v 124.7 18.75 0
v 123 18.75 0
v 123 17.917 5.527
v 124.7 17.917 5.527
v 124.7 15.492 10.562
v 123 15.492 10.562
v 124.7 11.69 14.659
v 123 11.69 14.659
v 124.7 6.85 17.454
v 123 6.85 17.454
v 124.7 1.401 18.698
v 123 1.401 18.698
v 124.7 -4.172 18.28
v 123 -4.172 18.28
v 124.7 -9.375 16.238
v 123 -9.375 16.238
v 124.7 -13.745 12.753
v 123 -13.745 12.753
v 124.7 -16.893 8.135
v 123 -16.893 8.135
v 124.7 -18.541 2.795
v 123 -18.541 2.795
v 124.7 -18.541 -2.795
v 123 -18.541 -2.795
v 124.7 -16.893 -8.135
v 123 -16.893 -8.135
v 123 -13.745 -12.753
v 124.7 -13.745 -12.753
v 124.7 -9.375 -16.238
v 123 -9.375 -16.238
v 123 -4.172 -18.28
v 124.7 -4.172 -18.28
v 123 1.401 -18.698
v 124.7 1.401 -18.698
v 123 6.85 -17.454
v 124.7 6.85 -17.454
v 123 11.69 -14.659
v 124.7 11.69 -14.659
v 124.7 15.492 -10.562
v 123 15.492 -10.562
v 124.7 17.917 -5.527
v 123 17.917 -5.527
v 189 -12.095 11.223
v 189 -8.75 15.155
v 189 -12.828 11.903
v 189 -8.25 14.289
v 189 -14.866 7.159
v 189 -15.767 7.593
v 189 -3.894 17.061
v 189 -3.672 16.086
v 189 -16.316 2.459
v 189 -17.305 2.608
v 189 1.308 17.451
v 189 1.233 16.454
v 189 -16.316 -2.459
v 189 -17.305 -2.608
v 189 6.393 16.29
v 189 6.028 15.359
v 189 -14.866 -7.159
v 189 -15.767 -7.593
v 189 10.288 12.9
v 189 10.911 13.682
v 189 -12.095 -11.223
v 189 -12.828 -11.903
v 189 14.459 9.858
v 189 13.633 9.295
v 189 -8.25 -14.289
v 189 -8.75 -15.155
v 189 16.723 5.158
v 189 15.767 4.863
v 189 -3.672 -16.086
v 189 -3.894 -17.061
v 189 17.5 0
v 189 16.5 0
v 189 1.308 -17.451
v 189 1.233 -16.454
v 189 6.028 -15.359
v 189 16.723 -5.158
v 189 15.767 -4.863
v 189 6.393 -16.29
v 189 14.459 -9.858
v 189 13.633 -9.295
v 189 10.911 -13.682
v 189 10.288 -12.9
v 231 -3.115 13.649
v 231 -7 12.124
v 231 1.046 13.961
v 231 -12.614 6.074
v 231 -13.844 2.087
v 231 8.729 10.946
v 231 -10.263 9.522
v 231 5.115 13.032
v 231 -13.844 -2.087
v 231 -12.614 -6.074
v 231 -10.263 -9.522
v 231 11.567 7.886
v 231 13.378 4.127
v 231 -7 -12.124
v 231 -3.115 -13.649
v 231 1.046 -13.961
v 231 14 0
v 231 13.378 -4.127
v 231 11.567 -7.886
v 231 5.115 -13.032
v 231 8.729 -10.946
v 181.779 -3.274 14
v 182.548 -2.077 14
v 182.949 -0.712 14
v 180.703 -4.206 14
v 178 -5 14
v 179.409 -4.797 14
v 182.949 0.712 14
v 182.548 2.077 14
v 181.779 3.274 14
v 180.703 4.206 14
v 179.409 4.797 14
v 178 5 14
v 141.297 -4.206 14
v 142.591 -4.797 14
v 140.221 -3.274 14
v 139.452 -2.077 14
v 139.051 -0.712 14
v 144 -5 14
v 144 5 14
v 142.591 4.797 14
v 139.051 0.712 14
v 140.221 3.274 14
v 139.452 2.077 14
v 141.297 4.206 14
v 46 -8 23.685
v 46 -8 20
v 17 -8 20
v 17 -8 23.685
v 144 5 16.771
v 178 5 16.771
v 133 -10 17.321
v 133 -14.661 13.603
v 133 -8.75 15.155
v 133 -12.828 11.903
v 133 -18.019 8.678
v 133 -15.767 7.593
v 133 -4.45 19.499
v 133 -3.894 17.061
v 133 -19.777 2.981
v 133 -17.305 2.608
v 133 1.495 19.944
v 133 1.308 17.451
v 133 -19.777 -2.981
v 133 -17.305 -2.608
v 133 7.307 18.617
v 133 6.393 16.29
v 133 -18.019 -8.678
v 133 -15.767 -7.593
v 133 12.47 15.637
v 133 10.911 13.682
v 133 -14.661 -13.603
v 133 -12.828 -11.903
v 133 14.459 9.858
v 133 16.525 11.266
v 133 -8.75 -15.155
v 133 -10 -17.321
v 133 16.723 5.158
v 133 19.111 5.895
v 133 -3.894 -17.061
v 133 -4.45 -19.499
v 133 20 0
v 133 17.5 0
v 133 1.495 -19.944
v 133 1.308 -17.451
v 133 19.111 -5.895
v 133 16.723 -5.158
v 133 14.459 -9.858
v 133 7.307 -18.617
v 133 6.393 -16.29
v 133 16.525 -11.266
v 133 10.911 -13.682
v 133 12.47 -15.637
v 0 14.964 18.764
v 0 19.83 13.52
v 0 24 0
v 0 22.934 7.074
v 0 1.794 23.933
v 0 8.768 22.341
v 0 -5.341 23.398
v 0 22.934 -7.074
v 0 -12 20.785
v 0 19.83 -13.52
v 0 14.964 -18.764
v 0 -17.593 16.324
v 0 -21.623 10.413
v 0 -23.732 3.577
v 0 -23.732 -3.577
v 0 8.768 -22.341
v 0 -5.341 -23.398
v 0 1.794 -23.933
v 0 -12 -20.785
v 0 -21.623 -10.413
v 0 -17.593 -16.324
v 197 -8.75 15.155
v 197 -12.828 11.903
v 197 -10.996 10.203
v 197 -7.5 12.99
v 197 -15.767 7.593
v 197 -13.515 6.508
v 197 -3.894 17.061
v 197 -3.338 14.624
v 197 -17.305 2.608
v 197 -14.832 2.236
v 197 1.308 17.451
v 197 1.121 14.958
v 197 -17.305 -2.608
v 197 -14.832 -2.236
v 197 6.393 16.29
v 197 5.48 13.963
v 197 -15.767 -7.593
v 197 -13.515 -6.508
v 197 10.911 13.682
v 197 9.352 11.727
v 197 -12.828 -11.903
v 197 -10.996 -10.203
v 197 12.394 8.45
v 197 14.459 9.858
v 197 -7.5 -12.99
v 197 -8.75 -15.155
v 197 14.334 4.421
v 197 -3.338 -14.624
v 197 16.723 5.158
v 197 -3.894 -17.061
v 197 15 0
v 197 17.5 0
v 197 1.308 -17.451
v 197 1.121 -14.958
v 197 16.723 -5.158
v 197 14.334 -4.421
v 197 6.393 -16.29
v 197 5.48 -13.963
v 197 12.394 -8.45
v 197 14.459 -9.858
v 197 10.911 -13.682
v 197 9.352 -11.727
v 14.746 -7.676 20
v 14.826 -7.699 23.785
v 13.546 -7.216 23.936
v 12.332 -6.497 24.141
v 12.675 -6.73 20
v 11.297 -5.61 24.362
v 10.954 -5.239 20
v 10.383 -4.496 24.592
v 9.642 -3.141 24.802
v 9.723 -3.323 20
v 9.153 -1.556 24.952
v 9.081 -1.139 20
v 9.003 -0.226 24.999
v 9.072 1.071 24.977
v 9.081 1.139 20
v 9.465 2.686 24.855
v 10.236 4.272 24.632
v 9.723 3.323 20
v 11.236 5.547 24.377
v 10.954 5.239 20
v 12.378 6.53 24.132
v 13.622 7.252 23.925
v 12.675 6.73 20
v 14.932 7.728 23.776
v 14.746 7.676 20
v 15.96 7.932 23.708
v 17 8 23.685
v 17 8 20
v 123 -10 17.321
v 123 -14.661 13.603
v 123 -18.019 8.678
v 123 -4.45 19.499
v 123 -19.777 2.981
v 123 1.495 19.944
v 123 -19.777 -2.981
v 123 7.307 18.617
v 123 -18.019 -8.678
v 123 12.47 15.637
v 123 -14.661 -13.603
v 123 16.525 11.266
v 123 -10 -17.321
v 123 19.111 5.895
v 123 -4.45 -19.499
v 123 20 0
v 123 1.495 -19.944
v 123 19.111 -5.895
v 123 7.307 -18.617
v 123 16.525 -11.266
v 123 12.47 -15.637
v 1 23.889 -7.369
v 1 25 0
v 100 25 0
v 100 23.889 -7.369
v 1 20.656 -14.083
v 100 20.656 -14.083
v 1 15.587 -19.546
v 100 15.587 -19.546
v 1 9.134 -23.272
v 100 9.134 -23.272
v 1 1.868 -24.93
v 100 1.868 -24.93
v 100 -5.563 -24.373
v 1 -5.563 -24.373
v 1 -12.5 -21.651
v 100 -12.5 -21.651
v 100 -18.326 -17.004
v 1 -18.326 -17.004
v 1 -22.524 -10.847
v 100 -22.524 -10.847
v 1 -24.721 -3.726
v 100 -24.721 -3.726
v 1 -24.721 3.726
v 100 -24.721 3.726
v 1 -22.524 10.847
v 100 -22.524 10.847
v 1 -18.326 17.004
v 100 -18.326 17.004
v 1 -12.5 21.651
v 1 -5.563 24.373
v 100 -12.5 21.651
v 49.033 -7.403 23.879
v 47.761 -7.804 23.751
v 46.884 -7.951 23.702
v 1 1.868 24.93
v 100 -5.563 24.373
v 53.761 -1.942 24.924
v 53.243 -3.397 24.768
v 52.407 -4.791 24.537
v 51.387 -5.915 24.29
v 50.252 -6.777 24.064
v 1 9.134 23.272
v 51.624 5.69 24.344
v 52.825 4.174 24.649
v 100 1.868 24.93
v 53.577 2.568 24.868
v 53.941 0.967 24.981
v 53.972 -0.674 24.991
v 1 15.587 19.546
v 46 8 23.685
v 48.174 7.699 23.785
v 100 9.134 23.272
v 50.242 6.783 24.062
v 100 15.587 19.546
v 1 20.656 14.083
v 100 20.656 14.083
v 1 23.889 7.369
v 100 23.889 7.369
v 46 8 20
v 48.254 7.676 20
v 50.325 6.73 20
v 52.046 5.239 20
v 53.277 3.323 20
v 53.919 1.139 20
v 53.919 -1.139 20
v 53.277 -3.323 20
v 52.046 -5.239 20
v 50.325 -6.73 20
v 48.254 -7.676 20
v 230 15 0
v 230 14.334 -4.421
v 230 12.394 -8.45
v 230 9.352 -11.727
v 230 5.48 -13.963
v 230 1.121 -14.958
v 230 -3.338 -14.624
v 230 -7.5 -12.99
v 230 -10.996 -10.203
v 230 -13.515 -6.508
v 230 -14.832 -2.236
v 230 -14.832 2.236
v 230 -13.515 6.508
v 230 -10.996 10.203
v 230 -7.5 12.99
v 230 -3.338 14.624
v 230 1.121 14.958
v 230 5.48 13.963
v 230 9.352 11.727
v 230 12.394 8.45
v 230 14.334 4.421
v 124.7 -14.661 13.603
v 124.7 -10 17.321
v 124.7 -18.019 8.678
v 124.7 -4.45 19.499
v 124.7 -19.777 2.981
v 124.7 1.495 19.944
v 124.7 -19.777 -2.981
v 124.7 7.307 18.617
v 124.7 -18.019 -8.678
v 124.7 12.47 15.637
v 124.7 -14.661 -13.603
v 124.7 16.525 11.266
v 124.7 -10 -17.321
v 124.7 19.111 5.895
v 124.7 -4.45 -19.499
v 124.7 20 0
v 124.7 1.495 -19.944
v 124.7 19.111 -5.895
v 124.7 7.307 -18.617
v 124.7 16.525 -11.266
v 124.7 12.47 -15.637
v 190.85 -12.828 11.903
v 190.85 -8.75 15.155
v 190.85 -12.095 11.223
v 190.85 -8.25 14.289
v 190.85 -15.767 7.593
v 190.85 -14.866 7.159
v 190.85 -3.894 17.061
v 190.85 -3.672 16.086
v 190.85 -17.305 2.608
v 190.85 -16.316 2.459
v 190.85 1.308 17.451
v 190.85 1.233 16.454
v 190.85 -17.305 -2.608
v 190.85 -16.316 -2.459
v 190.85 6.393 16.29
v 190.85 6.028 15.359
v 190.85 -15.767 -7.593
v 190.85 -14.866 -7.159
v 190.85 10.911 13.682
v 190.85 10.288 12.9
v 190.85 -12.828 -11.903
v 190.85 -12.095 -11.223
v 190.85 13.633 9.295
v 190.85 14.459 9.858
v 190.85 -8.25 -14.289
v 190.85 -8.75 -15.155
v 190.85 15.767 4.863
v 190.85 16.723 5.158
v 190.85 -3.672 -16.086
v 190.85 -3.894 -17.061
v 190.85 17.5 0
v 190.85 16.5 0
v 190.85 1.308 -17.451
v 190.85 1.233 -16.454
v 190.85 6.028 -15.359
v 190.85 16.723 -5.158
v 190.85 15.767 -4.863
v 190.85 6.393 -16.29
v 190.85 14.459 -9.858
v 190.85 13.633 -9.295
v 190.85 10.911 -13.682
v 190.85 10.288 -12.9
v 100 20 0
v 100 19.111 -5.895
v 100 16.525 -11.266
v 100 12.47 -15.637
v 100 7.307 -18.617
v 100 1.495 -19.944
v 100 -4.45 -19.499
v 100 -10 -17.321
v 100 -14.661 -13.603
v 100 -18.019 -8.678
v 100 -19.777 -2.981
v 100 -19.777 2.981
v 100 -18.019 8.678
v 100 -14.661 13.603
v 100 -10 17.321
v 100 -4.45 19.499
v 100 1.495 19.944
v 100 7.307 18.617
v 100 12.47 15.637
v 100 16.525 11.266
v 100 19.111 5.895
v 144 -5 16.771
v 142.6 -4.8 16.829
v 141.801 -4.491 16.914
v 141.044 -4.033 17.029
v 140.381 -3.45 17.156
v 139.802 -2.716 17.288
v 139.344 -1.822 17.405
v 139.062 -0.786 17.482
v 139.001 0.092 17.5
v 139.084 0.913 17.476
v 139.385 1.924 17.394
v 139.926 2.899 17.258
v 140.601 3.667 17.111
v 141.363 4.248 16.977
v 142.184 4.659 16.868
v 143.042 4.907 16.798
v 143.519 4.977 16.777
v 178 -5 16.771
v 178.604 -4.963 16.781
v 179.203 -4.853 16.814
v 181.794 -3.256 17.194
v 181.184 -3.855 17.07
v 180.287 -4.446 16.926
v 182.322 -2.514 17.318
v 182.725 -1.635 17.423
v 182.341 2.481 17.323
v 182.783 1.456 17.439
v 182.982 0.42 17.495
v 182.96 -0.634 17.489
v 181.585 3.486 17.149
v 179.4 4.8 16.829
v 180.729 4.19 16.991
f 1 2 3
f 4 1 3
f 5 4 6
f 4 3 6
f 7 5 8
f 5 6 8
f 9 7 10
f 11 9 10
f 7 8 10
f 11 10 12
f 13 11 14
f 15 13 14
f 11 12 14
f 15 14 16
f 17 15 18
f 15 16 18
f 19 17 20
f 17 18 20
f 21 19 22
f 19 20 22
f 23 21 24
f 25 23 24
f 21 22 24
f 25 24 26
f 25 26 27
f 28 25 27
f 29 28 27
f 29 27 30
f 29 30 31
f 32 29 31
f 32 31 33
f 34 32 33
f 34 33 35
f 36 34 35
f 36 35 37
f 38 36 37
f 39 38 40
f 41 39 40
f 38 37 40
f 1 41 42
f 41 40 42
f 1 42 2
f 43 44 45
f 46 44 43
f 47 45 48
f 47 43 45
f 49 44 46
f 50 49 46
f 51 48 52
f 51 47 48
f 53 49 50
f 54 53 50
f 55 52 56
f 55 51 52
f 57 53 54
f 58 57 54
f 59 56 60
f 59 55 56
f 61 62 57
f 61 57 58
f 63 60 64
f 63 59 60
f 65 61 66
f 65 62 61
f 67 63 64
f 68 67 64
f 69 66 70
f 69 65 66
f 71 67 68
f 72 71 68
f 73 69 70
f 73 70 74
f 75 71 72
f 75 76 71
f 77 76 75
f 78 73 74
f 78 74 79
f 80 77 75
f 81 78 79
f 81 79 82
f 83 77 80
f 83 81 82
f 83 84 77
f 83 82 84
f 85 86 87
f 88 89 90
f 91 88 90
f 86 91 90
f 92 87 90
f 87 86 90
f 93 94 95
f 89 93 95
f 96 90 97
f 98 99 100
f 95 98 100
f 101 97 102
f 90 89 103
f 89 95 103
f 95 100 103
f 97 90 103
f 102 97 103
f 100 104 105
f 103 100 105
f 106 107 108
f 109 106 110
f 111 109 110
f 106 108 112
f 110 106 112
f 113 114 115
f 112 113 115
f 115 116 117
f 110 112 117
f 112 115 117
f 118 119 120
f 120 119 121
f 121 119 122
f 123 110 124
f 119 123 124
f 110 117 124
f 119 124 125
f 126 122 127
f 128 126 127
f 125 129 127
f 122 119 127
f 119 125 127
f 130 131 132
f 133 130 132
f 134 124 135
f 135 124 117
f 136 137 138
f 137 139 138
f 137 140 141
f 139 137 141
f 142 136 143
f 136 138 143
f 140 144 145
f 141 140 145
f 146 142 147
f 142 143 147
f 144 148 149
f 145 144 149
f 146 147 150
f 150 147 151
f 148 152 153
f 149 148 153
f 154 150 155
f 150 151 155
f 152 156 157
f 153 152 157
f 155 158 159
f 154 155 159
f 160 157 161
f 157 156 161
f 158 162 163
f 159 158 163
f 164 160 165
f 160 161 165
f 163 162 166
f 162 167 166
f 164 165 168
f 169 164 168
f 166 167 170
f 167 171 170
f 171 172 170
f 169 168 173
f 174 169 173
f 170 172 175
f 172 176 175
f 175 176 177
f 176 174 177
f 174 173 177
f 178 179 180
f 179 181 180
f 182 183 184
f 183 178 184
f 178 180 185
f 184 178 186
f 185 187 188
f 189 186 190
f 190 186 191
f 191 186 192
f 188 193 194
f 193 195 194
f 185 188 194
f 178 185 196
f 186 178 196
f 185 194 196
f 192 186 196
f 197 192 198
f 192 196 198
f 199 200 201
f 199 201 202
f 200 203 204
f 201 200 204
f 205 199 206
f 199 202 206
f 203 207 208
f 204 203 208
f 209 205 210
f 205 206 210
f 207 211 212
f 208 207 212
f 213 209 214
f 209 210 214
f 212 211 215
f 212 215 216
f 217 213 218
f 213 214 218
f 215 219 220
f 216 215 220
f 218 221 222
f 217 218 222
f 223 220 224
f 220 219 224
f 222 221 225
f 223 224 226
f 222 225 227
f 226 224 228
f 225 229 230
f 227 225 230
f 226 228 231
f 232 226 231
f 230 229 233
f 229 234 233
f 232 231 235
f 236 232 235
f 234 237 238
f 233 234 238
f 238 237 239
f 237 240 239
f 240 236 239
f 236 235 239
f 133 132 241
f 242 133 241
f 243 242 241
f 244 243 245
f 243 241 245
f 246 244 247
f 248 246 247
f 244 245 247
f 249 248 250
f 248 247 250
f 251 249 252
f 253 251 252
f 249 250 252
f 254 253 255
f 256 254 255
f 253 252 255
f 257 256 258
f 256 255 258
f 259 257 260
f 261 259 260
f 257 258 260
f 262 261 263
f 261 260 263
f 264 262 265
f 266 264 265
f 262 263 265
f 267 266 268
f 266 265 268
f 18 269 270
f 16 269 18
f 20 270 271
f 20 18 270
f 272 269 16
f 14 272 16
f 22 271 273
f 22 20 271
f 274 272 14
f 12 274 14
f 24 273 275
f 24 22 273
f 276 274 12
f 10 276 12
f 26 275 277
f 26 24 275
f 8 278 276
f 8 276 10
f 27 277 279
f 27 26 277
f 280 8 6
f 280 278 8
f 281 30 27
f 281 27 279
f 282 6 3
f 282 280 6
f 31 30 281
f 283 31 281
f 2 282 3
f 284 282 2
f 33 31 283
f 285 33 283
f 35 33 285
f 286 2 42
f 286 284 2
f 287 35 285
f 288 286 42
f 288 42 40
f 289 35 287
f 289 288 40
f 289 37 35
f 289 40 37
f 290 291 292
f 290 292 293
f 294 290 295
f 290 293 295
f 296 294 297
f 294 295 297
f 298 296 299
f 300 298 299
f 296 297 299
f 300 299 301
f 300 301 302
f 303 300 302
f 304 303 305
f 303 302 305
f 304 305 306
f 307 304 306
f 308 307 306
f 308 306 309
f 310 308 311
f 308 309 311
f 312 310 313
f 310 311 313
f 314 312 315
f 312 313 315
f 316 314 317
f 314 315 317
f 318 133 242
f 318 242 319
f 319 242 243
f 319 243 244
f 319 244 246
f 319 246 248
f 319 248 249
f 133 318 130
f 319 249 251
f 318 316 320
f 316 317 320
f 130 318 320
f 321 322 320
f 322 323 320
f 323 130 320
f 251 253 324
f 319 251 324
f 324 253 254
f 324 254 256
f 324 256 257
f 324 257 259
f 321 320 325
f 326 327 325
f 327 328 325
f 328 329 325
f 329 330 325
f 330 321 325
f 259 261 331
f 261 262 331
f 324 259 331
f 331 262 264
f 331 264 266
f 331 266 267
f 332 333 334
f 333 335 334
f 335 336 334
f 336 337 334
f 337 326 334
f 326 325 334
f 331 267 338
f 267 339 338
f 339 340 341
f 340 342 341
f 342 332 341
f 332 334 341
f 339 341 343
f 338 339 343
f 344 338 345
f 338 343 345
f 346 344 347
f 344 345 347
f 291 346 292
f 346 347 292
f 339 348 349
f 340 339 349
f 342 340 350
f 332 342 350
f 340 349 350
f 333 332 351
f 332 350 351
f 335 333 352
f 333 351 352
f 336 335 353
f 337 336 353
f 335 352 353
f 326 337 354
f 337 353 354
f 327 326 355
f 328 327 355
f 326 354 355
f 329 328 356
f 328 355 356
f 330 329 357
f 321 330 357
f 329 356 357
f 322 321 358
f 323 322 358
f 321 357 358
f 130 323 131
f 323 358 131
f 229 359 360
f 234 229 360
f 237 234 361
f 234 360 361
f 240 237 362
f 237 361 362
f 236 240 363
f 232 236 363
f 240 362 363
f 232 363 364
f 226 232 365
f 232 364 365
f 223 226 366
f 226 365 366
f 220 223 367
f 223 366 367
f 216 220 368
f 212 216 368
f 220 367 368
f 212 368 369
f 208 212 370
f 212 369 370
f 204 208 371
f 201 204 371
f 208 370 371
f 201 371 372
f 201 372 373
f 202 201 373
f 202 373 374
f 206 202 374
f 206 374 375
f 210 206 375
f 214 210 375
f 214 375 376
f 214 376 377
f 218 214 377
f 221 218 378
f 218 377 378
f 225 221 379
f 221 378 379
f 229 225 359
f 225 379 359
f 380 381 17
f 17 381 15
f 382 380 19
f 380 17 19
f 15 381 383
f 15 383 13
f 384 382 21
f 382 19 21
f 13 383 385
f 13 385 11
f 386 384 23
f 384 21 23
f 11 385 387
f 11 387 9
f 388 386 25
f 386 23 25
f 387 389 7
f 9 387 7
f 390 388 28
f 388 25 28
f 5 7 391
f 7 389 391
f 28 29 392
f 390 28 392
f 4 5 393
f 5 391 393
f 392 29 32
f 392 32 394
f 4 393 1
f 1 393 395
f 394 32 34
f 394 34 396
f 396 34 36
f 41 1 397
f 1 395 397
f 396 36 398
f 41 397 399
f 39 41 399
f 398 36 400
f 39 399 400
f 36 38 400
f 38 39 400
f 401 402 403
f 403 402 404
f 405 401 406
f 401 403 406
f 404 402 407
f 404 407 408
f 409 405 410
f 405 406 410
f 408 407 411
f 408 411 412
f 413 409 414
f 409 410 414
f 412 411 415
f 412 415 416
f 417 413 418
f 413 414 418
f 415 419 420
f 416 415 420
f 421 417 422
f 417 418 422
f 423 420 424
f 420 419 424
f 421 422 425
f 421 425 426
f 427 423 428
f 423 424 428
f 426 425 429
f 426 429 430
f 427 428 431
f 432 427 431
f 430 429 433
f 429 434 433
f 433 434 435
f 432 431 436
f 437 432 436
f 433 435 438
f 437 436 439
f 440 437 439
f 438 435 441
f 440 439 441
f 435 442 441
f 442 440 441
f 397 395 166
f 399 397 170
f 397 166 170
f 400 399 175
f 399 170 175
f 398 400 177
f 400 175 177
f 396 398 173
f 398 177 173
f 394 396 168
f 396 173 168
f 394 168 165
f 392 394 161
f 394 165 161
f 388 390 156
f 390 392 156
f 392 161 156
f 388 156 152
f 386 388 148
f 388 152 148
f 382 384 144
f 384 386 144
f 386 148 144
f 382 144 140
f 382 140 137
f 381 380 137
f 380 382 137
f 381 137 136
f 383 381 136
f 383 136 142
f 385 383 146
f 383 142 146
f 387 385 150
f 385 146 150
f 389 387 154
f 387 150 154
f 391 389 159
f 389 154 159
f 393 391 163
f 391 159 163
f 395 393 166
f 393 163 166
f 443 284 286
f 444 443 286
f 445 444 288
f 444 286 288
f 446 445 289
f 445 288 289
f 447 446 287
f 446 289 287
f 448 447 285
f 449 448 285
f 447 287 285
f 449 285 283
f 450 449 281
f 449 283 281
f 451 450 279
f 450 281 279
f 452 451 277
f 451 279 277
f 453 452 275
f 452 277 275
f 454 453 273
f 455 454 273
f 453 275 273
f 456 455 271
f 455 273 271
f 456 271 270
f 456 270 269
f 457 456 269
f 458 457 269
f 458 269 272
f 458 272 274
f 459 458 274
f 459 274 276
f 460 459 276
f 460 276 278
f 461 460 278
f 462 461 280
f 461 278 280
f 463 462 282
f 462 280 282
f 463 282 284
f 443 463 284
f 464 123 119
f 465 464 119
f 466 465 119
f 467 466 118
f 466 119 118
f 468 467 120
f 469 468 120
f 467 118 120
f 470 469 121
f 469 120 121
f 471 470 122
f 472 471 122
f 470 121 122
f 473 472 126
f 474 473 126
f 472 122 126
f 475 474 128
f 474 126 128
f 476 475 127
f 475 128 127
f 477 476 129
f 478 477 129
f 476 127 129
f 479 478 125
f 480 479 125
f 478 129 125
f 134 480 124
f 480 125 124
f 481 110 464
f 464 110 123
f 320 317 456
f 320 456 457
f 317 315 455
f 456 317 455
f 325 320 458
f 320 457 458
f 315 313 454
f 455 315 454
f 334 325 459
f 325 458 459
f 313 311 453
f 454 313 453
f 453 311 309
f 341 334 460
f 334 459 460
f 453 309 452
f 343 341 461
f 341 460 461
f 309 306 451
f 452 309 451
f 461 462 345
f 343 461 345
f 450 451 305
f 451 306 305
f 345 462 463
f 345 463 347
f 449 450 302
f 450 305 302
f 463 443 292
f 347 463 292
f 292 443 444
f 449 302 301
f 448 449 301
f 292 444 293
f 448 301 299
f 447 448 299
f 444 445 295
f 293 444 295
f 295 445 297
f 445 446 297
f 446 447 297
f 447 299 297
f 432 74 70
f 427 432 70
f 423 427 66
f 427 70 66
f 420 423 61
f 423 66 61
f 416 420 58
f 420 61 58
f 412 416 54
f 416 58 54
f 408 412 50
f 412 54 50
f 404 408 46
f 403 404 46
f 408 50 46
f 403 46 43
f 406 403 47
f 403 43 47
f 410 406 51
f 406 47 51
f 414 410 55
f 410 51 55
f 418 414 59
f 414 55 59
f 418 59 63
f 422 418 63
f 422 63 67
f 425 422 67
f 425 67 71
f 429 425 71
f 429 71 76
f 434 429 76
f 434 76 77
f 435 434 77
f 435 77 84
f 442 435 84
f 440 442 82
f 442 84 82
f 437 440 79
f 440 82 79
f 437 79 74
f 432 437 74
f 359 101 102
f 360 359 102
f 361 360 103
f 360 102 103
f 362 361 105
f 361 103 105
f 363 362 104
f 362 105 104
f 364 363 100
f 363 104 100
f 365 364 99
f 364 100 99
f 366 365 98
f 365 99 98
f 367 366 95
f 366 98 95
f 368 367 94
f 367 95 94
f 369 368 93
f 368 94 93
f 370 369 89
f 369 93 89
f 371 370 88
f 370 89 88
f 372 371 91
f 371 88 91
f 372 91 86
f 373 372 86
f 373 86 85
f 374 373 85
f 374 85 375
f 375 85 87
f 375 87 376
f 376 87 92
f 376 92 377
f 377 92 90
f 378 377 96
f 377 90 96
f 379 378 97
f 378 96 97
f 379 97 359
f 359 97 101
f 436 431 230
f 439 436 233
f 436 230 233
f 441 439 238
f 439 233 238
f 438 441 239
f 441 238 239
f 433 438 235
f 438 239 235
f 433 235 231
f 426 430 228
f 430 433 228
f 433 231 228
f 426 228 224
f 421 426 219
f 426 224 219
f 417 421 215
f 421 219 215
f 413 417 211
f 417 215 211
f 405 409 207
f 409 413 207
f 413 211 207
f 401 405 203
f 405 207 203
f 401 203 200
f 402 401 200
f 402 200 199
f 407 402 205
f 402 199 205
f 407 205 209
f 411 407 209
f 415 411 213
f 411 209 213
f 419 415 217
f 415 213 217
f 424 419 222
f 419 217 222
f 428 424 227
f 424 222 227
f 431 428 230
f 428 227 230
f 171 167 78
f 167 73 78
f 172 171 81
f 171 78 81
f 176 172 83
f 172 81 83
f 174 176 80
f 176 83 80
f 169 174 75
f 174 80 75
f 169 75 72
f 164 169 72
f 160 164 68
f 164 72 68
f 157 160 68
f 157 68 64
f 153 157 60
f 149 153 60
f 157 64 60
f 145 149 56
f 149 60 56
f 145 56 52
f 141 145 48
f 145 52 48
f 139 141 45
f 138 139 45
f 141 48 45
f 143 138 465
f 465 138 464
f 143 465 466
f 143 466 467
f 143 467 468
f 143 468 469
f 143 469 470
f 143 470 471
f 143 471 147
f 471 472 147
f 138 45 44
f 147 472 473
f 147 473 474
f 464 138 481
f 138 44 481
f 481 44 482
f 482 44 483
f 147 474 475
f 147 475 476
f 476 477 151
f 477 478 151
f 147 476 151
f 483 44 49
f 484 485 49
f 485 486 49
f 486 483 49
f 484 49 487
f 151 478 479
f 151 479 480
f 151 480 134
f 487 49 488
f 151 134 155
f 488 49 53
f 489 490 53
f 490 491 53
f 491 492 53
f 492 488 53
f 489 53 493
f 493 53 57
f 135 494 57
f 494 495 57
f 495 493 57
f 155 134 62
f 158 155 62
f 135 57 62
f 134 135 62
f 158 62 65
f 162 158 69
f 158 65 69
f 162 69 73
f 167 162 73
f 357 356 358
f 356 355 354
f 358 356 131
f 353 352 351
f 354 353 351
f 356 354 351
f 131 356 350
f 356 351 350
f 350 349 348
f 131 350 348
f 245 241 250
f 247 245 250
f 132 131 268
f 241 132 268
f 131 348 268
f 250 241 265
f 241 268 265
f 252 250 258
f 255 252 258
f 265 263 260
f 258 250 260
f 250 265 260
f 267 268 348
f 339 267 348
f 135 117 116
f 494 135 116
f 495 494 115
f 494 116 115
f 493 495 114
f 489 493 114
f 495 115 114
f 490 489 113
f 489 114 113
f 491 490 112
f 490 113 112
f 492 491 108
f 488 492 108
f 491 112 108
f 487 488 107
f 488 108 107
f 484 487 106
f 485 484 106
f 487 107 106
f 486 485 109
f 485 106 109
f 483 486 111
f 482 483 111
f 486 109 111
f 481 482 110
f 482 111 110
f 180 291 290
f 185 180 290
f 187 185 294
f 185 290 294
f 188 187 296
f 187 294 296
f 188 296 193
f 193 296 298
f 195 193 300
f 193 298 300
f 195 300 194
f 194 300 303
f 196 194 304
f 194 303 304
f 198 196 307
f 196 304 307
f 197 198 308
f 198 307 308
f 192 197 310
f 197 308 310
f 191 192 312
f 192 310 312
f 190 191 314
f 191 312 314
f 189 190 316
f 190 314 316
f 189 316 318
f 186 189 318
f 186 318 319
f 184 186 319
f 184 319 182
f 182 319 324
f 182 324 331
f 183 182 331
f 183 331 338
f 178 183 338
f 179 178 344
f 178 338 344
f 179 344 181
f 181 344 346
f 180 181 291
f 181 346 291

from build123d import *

# Parameters (mm, degrees)
CHAMFER_1_SIZE      = 1
CUT_EXTRUDE_START   = -8
SKETCH_2_OUTSIDE_W  = 100.316
SKETCH_2_OUTSIDE_H  = 100.316
SKETCH_2_OUTSIDE_R  = 16.5
CUT_EXTRUDE_1_DEPTH = 1.85
CUT_EXTRUDE_START_2 = -10
SKETCH_3_OUTSIDE_W  = 100.316
SKETCH_3_OUTSIDE_H  = 100.316
SKETCH_3_OUTSIDE_R  = 18.75
CUT_EXTRUDE_2_DEPTH = 1.7
CUT_EXTRUDE_START_3 = 20
CUT_EXTRUDE_3_DEPTH = 214.689965553
CUT_EXTRUDE_START_4 = 14
CUT_EXTRUDE_4_DEPTH = 220.689965574


with BuildPart() as part:
    # 草图1 → 旋转1 (revolve)
    with BuildSketch(Plane.XY):
        Polygon((0, 0), (0, 25), (100, 25), (100, 20), (133, 20), (133, 17.5), (197, 17.5), (197, 15), (231, 15), (231, 0), align=None)
    revolve(axis=Axis((231, 0, 0), (-1, 0, 0)))

    # 倒角1
    chamfer_1_edges = [part.edges().sort_by_distance(p)[0] for p in [
        (0, -25, 0),
        (231, -15, 0),
    ]]
    chamfer(chamfer_1_edges, length=CHAMFER_1_SIZE)

    # 草图2 outside → 切除-拉伸1 (cut)
    with BuildSketch(Plane(origin=(197, 0, 0), x_dir=(0, 0, -1), z_dir=(1, 0, 0)).offset(CUT_EXTRUDE_START)):
        Rectangle(SKETCH_2_OUTSIDE_W, SKETCH_2_OUTSIDE_H)
        with Locations(Location((0, 0, 0), (0, 0, 90))):
            Circle(SKETCH_2_OUTSIDE_R, mode=Mode.SUBTRACT)
    extrude(amount=CUT_EXTRUDE_1_DEPTH, mode=Mode.SUBTRACT)

    # 草图3 outside → 切除-拉伸2 (cut)
    with BuildSketch(Plane(origin=(133, 0, 0), x_dir=(0, 0, -1), z_dir=(1, 0, 0)).offset(CUT_EXTRUDE_START_2)):
        Rectangle(SKETCH_3_OUTSIDE_W, SKETCH_3_OUTSIDE_H)
        with Locations(Location((0, 0, 0), (0, 0, 90))):
            Circle(SKETCH_3_OUTSIDE_R, mode=Mode.SUBTRACT)
    extrude(amount=CUT_EXTRUDE_2_DEPTH, mode=Mode.SUBTRACT)

    # 草图4 → 切除-拉伸3 (cut, through all)
    with BuildSketch(Plane.XY.offset(CUT_EXTRUDE_START_3)):
        with BuildLine():
            Line((17, 8), (46, 8))
            ThreePointArc((46, 8), (54, 0), (46, -8))
            Line((46, -8), (17, -8))
            ThreePointArc((17, -8), (9, 0), (17, 8))
        make_face()
    extrude(amount=CUT_EXTRUDE_3_DEPTH, mode=Mode.SUBTRACT)

    # 草图5 → 切除-拉伸4 (cut, through all)
    with BuildSketch(Plane.XY.offset(CUT_EXTRUDE_START_4)):
        with BuildLine():
            Line((144, 5), (178, 5))
            ThreePointArc((178, 5), (183, 0), (178, -5))
            Line((178, -5), (144, -5))
            ThreePointArc((144, -5), (139, 0), (144, 5))
        make_face()
    extrude(amount=CUT_EXTRUDE_4_DEPTH, mode=Mode.SUBTRACT)


solid = part.part
